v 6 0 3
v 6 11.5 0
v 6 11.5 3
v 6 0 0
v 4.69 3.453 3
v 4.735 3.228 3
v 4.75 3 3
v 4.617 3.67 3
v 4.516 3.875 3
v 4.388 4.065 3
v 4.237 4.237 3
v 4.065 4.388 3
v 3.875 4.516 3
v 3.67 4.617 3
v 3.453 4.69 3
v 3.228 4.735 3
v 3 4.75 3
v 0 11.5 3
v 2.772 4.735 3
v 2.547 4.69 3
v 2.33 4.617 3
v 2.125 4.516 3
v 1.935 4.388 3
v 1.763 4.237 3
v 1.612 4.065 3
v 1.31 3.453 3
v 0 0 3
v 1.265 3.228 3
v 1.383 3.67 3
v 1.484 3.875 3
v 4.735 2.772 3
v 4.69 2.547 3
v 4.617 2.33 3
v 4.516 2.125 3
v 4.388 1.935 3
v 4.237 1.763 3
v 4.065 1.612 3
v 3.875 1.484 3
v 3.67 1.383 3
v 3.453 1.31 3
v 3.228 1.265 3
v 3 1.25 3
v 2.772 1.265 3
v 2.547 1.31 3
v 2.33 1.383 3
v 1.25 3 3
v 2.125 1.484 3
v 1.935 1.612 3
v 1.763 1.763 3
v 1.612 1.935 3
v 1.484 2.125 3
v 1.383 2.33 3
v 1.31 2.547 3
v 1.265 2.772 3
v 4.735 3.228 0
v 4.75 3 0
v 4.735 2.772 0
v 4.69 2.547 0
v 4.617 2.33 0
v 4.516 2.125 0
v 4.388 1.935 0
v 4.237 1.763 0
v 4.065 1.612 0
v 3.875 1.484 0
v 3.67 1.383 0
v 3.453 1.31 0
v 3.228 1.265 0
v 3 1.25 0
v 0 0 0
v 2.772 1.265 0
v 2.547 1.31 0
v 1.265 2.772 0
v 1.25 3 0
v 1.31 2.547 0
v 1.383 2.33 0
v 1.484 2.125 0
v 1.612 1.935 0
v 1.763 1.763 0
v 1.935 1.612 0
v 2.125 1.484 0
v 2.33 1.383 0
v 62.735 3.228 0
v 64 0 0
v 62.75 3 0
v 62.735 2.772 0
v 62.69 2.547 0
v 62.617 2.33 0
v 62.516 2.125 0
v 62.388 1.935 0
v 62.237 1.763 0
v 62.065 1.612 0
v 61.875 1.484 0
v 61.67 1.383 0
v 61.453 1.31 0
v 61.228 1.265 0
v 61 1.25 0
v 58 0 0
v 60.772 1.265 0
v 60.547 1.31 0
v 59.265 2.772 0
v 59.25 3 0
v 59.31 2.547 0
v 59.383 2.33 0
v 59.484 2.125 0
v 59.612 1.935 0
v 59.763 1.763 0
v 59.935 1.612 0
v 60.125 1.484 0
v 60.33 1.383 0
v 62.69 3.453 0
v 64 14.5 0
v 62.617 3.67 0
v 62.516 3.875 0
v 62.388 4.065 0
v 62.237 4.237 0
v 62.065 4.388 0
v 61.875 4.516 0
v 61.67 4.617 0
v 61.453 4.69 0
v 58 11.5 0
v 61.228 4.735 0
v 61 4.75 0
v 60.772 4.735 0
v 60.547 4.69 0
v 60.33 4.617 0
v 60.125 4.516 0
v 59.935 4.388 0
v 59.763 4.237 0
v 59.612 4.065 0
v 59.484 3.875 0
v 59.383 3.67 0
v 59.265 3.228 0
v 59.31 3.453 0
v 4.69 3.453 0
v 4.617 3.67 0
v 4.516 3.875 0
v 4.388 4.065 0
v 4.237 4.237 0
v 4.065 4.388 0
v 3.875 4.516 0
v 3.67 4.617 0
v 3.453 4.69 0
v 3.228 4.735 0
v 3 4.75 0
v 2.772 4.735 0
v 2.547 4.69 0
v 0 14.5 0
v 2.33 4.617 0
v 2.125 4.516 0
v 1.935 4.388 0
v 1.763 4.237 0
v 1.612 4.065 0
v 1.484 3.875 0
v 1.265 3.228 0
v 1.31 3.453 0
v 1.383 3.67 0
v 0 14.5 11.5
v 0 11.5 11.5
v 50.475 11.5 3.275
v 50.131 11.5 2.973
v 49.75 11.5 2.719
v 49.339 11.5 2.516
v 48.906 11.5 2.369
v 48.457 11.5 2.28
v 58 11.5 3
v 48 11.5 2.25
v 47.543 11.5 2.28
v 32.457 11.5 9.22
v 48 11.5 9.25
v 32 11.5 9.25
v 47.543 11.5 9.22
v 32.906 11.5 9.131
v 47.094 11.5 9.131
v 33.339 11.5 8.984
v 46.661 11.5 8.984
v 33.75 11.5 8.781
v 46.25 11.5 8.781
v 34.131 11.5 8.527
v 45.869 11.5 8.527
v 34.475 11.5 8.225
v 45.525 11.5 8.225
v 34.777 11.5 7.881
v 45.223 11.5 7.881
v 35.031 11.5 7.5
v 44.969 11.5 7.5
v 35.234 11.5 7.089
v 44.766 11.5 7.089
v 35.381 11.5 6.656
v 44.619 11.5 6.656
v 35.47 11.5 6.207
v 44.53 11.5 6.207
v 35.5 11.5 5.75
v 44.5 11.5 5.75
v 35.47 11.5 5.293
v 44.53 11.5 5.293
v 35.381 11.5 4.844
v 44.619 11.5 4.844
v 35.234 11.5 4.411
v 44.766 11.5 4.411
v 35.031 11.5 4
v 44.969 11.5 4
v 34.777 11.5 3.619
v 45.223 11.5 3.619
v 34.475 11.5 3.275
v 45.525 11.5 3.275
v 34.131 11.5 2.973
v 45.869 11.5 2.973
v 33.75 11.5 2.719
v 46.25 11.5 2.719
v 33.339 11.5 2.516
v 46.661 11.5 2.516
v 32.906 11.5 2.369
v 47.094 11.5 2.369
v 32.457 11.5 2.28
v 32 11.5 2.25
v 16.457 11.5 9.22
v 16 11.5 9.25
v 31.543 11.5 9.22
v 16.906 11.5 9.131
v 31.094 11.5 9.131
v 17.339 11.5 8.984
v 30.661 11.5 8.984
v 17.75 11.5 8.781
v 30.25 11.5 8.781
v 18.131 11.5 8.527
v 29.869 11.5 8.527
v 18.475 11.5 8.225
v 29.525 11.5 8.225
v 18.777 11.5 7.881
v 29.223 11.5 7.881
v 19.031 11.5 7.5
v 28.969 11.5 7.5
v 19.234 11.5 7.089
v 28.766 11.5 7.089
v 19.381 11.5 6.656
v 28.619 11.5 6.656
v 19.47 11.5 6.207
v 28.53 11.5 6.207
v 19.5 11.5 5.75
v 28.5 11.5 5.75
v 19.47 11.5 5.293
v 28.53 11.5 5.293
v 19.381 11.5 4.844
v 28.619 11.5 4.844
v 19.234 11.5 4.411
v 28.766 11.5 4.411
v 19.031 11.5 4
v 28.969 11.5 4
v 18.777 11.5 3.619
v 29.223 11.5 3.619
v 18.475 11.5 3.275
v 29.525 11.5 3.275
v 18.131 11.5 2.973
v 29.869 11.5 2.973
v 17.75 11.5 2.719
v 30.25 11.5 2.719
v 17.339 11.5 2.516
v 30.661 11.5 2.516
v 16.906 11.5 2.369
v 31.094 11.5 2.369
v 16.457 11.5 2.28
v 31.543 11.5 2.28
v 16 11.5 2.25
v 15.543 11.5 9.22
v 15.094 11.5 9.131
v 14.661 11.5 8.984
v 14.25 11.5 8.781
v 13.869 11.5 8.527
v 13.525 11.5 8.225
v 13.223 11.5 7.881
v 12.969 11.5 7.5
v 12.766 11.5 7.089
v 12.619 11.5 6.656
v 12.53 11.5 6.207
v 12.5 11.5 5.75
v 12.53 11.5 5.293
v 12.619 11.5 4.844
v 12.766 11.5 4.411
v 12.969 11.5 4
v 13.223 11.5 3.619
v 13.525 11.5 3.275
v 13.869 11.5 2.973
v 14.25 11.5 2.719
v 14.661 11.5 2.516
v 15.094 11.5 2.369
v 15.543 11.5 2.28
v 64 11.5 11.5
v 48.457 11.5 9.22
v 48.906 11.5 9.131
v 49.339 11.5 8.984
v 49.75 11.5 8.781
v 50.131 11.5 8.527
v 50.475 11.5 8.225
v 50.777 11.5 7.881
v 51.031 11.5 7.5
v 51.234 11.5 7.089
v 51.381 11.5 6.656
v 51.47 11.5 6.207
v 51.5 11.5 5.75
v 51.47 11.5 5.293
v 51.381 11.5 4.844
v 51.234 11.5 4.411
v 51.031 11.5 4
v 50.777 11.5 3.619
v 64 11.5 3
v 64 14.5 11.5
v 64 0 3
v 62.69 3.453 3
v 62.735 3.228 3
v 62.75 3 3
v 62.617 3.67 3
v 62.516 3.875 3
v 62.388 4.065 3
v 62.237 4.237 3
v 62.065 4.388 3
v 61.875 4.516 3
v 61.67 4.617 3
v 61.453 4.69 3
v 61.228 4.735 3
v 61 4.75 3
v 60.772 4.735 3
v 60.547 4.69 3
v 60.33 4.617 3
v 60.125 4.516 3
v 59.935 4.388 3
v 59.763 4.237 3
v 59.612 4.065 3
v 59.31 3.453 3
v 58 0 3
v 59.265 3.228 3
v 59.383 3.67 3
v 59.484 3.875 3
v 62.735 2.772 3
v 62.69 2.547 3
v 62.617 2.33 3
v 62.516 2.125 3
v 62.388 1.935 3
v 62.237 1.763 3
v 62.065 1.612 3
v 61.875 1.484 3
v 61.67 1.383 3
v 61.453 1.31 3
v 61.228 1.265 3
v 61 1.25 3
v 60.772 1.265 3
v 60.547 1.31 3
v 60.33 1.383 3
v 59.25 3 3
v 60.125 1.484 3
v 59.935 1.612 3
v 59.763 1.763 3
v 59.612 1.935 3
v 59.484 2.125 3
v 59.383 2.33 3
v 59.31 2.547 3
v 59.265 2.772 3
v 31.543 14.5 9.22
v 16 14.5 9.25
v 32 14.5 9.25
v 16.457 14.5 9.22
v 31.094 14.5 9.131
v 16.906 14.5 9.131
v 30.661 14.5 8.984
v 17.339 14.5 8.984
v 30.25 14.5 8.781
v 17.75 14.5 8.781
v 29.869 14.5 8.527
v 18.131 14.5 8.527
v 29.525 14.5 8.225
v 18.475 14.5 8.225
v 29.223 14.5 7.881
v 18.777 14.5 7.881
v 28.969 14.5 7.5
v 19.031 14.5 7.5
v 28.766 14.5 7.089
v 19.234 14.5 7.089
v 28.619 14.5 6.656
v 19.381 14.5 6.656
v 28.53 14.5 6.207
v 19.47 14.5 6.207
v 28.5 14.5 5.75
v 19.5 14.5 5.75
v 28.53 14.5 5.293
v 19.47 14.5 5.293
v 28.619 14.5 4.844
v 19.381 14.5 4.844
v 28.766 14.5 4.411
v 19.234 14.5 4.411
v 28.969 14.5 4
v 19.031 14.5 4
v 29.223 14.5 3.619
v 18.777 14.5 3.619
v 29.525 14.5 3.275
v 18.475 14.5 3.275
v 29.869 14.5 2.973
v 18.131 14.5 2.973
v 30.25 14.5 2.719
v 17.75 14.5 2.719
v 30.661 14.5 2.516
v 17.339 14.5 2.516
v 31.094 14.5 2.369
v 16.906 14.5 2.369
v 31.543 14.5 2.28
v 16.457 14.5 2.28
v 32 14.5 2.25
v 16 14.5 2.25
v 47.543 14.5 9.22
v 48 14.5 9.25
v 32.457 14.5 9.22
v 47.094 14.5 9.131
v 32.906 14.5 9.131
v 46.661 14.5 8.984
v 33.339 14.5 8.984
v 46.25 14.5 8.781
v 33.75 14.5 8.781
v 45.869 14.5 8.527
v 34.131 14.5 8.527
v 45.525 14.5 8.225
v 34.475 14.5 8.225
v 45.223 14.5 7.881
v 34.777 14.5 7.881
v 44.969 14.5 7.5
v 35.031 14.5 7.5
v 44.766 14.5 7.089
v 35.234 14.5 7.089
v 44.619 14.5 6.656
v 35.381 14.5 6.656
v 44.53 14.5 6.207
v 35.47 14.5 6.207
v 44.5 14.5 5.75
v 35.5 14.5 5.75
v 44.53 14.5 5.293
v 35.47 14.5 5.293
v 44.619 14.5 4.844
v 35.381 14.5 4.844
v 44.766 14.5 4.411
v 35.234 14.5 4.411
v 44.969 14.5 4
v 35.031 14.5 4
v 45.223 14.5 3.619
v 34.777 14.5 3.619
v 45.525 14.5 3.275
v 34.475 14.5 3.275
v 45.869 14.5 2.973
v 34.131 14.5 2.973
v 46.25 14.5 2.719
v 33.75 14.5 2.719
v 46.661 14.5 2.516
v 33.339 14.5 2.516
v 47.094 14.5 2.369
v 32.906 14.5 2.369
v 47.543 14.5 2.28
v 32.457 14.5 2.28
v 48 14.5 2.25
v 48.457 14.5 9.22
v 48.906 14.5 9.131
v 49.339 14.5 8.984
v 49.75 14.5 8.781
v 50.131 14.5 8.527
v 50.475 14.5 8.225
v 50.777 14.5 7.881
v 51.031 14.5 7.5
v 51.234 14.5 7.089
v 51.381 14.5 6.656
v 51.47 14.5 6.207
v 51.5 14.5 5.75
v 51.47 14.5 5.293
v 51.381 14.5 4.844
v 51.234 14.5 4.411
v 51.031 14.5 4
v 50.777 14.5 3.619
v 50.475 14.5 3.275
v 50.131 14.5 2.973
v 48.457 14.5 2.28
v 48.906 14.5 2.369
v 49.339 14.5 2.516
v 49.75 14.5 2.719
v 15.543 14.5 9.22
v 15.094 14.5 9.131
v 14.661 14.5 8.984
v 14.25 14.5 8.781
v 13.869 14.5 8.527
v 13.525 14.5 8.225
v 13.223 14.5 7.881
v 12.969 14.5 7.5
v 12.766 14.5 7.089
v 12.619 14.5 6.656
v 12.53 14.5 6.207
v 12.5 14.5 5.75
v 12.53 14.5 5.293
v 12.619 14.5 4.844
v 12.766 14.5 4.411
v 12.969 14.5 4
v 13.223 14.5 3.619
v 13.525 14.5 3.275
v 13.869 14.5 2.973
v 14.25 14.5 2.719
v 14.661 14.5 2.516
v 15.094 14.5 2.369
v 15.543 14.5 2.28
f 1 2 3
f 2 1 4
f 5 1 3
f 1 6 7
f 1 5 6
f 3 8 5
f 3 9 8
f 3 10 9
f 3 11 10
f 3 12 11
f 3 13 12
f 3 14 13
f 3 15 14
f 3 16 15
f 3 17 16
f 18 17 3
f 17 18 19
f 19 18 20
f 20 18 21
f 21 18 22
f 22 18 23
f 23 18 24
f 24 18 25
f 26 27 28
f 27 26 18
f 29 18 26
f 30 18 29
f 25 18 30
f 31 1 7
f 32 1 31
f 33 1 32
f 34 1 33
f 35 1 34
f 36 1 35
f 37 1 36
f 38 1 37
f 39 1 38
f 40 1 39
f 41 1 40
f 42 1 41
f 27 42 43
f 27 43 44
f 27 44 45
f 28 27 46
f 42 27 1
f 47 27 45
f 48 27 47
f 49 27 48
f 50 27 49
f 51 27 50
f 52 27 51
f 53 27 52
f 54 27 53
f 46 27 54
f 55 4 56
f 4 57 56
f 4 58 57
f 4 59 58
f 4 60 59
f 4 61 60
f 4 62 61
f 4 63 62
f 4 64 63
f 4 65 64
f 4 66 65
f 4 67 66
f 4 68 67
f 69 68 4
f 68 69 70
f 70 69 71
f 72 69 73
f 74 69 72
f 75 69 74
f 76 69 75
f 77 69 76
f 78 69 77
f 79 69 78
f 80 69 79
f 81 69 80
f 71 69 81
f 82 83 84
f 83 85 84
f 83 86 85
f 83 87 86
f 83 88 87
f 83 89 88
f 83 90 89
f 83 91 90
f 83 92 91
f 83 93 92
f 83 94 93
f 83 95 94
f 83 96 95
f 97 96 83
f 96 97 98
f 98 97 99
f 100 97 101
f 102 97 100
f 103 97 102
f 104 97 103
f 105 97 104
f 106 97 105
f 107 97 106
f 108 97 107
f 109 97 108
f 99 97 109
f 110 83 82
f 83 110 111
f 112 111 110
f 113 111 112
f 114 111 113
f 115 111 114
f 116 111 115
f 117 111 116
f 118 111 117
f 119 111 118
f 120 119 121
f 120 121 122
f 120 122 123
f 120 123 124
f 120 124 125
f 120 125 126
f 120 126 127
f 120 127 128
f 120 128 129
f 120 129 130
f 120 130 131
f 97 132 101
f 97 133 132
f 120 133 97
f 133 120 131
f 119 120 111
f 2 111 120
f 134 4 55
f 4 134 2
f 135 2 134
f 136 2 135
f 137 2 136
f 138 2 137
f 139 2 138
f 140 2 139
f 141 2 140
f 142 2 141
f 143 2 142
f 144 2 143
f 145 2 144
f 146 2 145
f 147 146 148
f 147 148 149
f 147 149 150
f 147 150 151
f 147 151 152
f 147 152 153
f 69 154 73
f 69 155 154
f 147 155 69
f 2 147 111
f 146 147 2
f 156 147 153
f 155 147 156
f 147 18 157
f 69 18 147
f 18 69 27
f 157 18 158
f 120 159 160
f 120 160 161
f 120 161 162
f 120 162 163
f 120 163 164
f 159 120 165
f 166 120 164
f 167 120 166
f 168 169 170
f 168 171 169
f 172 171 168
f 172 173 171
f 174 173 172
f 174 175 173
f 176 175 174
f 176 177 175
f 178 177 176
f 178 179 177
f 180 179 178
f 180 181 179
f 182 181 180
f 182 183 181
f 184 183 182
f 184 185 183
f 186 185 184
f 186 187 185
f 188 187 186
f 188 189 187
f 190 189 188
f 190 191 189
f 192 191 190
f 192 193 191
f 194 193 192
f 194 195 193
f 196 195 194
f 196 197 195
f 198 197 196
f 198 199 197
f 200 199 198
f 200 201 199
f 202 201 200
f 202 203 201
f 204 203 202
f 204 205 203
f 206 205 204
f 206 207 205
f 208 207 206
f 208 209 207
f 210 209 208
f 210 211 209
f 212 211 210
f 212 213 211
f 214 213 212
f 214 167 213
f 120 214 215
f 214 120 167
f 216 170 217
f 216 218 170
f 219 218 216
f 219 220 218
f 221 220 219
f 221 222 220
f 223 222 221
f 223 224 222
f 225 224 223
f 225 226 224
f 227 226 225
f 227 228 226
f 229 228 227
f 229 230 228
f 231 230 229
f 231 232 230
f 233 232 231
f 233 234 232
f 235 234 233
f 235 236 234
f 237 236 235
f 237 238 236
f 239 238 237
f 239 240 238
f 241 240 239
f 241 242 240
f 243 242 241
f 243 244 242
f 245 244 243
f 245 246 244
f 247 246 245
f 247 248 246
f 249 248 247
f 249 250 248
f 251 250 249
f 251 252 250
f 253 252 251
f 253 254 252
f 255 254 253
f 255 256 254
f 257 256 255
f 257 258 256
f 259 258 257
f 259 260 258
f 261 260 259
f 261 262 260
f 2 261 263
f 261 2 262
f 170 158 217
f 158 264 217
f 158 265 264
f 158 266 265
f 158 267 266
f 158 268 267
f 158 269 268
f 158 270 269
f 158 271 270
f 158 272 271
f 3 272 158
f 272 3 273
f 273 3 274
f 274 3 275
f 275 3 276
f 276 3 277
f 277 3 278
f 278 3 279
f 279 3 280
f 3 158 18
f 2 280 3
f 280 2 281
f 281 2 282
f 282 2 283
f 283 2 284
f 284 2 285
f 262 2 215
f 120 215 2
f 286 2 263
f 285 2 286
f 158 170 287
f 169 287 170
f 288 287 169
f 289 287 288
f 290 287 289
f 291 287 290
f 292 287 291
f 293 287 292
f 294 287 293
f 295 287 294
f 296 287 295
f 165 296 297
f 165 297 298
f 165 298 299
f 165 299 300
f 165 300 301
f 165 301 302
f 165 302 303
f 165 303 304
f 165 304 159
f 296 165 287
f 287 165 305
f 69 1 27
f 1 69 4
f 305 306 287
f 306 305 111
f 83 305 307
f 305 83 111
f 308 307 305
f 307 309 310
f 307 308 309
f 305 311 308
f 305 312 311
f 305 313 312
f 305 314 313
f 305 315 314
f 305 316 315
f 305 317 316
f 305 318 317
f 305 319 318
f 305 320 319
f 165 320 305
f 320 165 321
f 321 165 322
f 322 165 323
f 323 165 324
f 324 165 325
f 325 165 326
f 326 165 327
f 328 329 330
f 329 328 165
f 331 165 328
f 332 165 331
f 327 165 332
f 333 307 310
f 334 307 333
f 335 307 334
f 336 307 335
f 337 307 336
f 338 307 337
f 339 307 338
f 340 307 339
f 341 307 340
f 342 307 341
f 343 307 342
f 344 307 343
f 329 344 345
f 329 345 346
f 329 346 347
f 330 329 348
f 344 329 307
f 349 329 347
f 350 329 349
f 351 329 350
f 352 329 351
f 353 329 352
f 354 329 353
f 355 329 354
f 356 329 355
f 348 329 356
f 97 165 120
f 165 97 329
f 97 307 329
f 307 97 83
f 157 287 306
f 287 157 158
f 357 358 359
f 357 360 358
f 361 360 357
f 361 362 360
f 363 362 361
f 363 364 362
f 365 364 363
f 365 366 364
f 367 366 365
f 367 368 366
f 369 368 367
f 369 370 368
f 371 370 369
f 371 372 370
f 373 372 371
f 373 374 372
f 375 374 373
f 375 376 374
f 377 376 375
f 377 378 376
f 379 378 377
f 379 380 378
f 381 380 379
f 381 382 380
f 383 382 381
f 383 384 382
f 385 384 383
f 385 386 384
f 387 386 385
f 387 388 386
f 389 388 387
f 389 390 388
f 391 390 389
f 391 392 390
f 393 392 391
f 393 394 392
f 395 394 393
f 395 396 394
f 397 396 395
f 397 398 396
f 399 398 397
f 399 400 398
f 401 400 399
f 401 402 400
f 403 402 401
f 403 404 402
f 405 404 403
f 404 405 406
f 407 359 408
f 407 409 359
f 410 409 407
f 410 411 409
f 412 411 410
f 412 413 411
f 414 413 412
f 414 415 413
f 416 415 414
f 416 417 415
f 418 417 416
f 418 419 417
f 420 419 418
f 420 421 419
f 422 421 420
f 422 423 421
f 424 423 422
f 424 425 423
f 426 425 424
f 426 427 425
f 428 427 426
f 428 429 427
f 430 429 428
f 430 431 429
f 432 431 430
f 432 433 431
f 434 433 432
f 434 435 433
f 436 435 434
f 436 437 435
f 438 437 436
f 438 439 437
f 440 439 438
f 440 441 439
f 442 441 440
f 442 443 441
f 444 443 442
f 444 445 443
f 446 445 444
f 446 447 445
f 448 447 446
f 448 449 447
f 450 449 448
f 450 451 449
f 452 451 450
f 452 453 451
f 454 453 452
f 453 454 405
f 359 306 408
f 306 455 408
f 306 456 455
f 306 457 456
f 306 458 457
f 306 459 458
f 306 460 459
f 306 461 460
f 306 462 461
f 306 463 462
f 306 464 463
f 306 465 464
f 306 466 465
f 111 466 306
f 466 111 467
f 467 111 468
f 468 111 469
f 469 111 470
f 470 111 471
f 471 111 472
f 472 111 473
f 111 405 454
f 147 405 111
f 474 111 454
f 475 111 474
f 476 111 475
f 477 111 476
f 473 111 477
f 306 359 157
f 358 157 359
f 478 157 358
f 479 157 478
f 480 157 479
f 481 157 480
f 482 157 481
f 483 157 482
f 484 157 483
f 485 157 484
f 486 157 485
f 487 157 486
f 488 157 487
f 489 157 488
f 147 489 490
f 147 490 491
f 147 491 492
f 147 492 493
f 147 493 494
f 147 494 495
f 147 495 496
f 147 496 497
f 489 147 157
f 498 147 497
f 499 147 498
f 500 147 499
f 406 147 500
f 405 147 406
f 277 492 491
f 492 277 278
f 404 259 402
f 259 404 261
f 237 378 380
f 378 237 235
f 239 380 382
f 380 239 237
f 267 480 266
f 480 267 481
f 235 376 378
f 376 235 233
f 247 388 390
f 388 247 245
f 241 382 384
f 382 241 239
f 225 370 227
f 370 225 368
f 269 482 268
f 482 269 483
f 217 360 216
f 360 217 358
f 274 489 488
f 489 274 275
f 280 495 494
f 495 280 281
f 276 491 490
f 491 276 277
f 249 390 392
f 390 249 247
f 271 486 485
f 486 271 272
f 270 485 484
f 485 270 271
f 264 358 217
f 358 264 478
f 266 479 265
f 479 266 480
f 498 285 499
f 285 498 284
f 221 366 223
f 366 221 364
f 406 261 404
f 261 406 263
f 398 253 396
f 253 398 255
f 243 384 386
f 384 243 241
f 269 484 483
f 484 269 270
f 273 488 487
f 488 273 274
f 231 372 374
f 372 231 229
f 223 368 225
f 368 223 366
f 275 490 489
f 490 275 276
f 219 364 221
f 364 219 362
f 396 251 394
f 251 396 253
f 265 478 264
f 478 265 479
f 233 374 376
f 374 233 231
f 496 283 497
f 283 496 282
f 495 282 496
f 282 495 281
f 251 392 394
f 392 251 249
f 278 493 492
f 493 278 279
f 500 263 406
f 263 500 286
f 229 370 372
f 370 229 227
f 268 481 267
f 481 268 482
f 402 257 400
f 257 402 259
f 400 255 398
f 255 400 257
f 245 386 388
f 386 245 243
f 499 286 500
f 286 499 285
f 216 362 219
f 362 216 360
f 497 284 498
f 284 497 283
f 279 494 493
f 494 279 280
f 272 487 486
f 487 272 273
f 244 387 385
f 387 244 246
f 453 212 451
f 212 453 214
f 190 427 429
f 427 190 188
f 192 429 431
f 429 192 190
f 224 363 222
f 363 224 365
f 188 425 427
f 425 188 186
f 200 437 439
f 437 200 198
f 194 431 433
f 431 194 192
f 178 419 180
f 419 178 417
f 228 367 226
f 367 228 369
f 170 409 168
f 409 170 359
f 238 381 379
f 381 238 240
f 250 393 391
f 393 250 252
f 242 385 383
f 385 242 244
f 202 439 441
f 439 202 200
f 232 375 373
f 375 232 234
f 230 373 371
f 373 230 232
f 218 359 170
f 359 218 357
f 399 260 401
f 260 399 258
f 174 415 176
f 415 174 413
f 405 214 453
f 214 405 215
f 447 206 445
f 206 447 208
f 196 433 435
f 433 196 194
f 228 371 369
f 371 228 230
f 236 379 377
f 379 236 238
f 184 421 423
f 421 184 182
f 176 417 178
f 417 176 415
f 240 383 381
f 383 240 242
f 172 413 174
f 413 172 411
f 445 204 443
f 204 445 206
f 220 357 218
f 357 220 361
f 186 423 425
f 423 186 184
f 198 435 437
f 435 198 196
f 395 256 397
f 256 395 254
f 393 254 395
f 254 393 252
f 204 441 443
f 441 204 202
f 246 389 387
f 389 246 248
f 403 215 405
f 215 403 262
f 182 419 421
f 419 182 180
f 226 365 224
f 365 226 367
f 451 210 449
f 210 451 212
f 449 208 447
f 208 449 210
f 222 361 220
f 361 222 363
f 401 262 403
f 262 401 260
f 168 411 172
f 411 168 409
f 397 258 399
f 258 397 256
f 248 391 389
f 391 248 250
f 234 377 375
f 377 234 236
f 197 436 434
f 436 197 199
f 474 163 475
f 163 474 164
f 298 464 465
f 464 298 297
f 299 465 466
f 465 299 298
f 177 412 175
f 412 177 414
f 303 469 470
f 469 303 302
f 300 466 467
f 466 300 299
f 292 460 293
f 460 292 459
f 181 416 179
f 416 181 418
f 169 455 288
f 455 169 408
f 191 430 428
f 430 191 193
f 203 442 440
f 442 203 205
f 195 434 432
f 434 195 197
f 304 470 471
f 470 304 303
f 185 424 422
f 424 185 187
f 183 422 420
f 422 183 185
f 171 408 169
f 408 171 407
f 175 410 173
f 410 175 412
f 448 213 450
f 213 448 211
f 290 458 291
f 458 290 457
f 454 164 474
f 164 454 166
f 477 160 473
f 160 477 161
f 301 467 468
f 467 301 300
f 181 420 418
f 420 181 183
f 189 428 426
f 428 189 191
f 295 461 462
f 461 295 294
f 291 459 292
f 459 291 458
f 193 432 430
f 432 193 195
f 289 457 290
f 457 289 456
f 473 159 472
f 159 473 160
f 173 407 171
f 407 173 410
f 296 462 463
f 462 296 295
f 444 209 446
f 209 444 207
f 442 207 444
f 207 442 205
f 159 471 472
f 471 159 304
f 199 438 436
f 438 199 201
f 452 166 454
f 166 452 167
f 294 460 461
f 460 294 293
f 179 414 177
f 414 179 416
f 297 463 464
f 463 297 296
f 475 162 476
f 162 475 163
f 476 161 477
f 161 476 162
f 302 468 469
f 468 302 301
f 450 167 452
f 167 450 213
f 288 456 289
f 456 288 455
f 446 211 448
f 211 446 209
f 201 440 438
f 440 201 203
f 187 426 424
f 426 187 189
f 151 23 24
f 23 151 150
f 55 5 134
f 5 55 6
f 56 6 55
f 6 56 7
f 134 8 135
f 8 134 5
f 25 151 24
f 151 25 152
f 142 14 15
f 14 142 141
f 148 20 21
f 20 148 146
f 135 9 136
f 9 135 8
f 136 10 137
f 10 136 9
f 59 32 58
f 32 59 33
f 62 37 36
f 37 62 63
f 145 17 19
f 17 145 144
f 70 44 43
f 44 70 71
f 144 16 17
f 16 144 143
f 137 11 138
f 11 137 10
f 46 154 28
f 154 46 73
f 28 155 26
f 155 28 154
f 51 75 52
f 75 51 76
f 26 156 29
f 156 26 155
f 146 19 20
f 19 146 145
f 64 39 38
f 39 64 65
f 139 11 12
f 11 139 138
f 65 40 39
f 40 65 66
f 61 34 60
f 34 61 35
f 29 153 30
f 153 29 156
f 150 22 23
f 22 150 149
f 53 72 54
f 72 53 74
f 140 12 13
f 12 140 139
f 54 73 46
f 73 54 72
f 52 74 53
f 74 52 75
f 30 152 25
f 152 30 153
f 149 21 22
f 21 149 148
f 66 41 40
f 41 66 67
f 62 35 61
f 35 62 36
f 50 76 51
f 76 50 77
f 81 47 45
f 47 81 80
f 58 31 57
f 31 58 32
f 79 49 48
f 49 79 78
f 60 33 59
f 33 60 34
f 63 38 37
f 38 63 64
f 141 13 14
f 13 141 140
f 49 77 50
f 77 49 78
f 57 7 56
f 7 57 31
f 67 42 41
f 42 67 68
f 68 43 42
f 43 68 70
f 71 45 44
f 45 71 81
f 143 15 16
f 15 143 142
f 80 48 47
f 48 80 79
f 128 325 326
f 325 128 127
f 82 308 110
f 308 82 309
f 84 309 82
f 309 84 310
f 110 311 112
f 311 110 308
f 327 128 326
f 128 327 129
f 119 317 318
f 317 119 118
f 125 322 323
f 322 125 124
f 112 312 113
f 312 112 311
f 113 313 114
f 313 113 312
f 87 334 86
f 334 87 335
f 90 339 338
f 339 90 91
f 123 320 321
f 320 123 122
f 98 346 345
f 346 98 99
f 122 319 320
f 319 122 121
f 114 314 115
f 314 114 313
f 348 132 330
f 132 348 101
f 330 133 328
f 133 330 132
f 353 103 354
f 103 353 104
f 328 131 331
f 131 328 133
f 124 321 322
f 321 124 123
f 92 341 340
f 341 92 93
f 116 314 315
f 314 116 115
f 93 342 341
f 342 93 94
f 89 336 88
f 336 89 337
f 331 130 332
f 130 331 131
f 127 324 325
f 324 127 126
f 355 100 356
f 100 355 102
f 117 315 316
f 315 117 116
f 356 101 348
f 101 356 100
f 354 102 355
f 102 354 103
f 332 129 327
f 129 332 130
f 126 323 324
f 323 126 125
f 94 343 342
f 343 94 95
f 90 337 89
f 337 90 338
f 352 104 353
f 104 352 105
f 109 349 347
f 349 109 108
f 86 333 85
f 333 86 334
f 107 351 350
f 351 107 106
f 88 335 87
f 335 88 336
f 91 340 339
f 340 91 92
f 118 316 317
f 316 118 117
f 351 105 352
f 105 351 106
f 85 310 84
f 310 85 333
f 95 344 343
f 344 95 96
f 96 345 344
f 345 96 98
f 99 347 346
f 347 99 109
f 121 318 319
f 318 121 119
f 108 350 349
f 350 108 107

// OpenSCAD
// Momentary pushbutton holder for Pi 3 A+
// 
qsw = 3; // Quantity of switches
phs = 58; // Pi Hole Spacing 
phR = (3.5/2); //Screw hole Radius
slX = 6; // Width (X) of landing on standoff
pbsR = (7/2); // Pushbutton switch shaft radius
pbsB = 10; // Pushbutton base diameter
pbsO = 4; // Offset added to phR to get total width of landing
landingX = phR+pbsO;
landingY = landingX*2;
inc = ((slX+phs)/(qsw+1));
$fn = 48;


module base(){
    cube([slX,landingY,3]);
    translate([phs,0,0])
    cube([slX,landingY,3]);
    translate([0,landingY,0])
    cube([slX+phs,3,landingY]);
}

module holes(){
    translate([slX/2,slX/2,-1])
    cylinder(h=6,r=phR);
    translate([(slX/2)+phs,(slX/2),-1])
    cylinder(h=6,r=(3.5/2));
    rotate([90,0,0])
    for (h=[inc:inc:(inc*qsw)]) {
        translate([h,landingY/2,-(landingY+4)])
        cylinder(h=6,r=pbsR);
    }

}
echo((slX*2+phs));
echo(qsw+1);
echo(inc);

difference(){
base();
holes();
}

// holes();
